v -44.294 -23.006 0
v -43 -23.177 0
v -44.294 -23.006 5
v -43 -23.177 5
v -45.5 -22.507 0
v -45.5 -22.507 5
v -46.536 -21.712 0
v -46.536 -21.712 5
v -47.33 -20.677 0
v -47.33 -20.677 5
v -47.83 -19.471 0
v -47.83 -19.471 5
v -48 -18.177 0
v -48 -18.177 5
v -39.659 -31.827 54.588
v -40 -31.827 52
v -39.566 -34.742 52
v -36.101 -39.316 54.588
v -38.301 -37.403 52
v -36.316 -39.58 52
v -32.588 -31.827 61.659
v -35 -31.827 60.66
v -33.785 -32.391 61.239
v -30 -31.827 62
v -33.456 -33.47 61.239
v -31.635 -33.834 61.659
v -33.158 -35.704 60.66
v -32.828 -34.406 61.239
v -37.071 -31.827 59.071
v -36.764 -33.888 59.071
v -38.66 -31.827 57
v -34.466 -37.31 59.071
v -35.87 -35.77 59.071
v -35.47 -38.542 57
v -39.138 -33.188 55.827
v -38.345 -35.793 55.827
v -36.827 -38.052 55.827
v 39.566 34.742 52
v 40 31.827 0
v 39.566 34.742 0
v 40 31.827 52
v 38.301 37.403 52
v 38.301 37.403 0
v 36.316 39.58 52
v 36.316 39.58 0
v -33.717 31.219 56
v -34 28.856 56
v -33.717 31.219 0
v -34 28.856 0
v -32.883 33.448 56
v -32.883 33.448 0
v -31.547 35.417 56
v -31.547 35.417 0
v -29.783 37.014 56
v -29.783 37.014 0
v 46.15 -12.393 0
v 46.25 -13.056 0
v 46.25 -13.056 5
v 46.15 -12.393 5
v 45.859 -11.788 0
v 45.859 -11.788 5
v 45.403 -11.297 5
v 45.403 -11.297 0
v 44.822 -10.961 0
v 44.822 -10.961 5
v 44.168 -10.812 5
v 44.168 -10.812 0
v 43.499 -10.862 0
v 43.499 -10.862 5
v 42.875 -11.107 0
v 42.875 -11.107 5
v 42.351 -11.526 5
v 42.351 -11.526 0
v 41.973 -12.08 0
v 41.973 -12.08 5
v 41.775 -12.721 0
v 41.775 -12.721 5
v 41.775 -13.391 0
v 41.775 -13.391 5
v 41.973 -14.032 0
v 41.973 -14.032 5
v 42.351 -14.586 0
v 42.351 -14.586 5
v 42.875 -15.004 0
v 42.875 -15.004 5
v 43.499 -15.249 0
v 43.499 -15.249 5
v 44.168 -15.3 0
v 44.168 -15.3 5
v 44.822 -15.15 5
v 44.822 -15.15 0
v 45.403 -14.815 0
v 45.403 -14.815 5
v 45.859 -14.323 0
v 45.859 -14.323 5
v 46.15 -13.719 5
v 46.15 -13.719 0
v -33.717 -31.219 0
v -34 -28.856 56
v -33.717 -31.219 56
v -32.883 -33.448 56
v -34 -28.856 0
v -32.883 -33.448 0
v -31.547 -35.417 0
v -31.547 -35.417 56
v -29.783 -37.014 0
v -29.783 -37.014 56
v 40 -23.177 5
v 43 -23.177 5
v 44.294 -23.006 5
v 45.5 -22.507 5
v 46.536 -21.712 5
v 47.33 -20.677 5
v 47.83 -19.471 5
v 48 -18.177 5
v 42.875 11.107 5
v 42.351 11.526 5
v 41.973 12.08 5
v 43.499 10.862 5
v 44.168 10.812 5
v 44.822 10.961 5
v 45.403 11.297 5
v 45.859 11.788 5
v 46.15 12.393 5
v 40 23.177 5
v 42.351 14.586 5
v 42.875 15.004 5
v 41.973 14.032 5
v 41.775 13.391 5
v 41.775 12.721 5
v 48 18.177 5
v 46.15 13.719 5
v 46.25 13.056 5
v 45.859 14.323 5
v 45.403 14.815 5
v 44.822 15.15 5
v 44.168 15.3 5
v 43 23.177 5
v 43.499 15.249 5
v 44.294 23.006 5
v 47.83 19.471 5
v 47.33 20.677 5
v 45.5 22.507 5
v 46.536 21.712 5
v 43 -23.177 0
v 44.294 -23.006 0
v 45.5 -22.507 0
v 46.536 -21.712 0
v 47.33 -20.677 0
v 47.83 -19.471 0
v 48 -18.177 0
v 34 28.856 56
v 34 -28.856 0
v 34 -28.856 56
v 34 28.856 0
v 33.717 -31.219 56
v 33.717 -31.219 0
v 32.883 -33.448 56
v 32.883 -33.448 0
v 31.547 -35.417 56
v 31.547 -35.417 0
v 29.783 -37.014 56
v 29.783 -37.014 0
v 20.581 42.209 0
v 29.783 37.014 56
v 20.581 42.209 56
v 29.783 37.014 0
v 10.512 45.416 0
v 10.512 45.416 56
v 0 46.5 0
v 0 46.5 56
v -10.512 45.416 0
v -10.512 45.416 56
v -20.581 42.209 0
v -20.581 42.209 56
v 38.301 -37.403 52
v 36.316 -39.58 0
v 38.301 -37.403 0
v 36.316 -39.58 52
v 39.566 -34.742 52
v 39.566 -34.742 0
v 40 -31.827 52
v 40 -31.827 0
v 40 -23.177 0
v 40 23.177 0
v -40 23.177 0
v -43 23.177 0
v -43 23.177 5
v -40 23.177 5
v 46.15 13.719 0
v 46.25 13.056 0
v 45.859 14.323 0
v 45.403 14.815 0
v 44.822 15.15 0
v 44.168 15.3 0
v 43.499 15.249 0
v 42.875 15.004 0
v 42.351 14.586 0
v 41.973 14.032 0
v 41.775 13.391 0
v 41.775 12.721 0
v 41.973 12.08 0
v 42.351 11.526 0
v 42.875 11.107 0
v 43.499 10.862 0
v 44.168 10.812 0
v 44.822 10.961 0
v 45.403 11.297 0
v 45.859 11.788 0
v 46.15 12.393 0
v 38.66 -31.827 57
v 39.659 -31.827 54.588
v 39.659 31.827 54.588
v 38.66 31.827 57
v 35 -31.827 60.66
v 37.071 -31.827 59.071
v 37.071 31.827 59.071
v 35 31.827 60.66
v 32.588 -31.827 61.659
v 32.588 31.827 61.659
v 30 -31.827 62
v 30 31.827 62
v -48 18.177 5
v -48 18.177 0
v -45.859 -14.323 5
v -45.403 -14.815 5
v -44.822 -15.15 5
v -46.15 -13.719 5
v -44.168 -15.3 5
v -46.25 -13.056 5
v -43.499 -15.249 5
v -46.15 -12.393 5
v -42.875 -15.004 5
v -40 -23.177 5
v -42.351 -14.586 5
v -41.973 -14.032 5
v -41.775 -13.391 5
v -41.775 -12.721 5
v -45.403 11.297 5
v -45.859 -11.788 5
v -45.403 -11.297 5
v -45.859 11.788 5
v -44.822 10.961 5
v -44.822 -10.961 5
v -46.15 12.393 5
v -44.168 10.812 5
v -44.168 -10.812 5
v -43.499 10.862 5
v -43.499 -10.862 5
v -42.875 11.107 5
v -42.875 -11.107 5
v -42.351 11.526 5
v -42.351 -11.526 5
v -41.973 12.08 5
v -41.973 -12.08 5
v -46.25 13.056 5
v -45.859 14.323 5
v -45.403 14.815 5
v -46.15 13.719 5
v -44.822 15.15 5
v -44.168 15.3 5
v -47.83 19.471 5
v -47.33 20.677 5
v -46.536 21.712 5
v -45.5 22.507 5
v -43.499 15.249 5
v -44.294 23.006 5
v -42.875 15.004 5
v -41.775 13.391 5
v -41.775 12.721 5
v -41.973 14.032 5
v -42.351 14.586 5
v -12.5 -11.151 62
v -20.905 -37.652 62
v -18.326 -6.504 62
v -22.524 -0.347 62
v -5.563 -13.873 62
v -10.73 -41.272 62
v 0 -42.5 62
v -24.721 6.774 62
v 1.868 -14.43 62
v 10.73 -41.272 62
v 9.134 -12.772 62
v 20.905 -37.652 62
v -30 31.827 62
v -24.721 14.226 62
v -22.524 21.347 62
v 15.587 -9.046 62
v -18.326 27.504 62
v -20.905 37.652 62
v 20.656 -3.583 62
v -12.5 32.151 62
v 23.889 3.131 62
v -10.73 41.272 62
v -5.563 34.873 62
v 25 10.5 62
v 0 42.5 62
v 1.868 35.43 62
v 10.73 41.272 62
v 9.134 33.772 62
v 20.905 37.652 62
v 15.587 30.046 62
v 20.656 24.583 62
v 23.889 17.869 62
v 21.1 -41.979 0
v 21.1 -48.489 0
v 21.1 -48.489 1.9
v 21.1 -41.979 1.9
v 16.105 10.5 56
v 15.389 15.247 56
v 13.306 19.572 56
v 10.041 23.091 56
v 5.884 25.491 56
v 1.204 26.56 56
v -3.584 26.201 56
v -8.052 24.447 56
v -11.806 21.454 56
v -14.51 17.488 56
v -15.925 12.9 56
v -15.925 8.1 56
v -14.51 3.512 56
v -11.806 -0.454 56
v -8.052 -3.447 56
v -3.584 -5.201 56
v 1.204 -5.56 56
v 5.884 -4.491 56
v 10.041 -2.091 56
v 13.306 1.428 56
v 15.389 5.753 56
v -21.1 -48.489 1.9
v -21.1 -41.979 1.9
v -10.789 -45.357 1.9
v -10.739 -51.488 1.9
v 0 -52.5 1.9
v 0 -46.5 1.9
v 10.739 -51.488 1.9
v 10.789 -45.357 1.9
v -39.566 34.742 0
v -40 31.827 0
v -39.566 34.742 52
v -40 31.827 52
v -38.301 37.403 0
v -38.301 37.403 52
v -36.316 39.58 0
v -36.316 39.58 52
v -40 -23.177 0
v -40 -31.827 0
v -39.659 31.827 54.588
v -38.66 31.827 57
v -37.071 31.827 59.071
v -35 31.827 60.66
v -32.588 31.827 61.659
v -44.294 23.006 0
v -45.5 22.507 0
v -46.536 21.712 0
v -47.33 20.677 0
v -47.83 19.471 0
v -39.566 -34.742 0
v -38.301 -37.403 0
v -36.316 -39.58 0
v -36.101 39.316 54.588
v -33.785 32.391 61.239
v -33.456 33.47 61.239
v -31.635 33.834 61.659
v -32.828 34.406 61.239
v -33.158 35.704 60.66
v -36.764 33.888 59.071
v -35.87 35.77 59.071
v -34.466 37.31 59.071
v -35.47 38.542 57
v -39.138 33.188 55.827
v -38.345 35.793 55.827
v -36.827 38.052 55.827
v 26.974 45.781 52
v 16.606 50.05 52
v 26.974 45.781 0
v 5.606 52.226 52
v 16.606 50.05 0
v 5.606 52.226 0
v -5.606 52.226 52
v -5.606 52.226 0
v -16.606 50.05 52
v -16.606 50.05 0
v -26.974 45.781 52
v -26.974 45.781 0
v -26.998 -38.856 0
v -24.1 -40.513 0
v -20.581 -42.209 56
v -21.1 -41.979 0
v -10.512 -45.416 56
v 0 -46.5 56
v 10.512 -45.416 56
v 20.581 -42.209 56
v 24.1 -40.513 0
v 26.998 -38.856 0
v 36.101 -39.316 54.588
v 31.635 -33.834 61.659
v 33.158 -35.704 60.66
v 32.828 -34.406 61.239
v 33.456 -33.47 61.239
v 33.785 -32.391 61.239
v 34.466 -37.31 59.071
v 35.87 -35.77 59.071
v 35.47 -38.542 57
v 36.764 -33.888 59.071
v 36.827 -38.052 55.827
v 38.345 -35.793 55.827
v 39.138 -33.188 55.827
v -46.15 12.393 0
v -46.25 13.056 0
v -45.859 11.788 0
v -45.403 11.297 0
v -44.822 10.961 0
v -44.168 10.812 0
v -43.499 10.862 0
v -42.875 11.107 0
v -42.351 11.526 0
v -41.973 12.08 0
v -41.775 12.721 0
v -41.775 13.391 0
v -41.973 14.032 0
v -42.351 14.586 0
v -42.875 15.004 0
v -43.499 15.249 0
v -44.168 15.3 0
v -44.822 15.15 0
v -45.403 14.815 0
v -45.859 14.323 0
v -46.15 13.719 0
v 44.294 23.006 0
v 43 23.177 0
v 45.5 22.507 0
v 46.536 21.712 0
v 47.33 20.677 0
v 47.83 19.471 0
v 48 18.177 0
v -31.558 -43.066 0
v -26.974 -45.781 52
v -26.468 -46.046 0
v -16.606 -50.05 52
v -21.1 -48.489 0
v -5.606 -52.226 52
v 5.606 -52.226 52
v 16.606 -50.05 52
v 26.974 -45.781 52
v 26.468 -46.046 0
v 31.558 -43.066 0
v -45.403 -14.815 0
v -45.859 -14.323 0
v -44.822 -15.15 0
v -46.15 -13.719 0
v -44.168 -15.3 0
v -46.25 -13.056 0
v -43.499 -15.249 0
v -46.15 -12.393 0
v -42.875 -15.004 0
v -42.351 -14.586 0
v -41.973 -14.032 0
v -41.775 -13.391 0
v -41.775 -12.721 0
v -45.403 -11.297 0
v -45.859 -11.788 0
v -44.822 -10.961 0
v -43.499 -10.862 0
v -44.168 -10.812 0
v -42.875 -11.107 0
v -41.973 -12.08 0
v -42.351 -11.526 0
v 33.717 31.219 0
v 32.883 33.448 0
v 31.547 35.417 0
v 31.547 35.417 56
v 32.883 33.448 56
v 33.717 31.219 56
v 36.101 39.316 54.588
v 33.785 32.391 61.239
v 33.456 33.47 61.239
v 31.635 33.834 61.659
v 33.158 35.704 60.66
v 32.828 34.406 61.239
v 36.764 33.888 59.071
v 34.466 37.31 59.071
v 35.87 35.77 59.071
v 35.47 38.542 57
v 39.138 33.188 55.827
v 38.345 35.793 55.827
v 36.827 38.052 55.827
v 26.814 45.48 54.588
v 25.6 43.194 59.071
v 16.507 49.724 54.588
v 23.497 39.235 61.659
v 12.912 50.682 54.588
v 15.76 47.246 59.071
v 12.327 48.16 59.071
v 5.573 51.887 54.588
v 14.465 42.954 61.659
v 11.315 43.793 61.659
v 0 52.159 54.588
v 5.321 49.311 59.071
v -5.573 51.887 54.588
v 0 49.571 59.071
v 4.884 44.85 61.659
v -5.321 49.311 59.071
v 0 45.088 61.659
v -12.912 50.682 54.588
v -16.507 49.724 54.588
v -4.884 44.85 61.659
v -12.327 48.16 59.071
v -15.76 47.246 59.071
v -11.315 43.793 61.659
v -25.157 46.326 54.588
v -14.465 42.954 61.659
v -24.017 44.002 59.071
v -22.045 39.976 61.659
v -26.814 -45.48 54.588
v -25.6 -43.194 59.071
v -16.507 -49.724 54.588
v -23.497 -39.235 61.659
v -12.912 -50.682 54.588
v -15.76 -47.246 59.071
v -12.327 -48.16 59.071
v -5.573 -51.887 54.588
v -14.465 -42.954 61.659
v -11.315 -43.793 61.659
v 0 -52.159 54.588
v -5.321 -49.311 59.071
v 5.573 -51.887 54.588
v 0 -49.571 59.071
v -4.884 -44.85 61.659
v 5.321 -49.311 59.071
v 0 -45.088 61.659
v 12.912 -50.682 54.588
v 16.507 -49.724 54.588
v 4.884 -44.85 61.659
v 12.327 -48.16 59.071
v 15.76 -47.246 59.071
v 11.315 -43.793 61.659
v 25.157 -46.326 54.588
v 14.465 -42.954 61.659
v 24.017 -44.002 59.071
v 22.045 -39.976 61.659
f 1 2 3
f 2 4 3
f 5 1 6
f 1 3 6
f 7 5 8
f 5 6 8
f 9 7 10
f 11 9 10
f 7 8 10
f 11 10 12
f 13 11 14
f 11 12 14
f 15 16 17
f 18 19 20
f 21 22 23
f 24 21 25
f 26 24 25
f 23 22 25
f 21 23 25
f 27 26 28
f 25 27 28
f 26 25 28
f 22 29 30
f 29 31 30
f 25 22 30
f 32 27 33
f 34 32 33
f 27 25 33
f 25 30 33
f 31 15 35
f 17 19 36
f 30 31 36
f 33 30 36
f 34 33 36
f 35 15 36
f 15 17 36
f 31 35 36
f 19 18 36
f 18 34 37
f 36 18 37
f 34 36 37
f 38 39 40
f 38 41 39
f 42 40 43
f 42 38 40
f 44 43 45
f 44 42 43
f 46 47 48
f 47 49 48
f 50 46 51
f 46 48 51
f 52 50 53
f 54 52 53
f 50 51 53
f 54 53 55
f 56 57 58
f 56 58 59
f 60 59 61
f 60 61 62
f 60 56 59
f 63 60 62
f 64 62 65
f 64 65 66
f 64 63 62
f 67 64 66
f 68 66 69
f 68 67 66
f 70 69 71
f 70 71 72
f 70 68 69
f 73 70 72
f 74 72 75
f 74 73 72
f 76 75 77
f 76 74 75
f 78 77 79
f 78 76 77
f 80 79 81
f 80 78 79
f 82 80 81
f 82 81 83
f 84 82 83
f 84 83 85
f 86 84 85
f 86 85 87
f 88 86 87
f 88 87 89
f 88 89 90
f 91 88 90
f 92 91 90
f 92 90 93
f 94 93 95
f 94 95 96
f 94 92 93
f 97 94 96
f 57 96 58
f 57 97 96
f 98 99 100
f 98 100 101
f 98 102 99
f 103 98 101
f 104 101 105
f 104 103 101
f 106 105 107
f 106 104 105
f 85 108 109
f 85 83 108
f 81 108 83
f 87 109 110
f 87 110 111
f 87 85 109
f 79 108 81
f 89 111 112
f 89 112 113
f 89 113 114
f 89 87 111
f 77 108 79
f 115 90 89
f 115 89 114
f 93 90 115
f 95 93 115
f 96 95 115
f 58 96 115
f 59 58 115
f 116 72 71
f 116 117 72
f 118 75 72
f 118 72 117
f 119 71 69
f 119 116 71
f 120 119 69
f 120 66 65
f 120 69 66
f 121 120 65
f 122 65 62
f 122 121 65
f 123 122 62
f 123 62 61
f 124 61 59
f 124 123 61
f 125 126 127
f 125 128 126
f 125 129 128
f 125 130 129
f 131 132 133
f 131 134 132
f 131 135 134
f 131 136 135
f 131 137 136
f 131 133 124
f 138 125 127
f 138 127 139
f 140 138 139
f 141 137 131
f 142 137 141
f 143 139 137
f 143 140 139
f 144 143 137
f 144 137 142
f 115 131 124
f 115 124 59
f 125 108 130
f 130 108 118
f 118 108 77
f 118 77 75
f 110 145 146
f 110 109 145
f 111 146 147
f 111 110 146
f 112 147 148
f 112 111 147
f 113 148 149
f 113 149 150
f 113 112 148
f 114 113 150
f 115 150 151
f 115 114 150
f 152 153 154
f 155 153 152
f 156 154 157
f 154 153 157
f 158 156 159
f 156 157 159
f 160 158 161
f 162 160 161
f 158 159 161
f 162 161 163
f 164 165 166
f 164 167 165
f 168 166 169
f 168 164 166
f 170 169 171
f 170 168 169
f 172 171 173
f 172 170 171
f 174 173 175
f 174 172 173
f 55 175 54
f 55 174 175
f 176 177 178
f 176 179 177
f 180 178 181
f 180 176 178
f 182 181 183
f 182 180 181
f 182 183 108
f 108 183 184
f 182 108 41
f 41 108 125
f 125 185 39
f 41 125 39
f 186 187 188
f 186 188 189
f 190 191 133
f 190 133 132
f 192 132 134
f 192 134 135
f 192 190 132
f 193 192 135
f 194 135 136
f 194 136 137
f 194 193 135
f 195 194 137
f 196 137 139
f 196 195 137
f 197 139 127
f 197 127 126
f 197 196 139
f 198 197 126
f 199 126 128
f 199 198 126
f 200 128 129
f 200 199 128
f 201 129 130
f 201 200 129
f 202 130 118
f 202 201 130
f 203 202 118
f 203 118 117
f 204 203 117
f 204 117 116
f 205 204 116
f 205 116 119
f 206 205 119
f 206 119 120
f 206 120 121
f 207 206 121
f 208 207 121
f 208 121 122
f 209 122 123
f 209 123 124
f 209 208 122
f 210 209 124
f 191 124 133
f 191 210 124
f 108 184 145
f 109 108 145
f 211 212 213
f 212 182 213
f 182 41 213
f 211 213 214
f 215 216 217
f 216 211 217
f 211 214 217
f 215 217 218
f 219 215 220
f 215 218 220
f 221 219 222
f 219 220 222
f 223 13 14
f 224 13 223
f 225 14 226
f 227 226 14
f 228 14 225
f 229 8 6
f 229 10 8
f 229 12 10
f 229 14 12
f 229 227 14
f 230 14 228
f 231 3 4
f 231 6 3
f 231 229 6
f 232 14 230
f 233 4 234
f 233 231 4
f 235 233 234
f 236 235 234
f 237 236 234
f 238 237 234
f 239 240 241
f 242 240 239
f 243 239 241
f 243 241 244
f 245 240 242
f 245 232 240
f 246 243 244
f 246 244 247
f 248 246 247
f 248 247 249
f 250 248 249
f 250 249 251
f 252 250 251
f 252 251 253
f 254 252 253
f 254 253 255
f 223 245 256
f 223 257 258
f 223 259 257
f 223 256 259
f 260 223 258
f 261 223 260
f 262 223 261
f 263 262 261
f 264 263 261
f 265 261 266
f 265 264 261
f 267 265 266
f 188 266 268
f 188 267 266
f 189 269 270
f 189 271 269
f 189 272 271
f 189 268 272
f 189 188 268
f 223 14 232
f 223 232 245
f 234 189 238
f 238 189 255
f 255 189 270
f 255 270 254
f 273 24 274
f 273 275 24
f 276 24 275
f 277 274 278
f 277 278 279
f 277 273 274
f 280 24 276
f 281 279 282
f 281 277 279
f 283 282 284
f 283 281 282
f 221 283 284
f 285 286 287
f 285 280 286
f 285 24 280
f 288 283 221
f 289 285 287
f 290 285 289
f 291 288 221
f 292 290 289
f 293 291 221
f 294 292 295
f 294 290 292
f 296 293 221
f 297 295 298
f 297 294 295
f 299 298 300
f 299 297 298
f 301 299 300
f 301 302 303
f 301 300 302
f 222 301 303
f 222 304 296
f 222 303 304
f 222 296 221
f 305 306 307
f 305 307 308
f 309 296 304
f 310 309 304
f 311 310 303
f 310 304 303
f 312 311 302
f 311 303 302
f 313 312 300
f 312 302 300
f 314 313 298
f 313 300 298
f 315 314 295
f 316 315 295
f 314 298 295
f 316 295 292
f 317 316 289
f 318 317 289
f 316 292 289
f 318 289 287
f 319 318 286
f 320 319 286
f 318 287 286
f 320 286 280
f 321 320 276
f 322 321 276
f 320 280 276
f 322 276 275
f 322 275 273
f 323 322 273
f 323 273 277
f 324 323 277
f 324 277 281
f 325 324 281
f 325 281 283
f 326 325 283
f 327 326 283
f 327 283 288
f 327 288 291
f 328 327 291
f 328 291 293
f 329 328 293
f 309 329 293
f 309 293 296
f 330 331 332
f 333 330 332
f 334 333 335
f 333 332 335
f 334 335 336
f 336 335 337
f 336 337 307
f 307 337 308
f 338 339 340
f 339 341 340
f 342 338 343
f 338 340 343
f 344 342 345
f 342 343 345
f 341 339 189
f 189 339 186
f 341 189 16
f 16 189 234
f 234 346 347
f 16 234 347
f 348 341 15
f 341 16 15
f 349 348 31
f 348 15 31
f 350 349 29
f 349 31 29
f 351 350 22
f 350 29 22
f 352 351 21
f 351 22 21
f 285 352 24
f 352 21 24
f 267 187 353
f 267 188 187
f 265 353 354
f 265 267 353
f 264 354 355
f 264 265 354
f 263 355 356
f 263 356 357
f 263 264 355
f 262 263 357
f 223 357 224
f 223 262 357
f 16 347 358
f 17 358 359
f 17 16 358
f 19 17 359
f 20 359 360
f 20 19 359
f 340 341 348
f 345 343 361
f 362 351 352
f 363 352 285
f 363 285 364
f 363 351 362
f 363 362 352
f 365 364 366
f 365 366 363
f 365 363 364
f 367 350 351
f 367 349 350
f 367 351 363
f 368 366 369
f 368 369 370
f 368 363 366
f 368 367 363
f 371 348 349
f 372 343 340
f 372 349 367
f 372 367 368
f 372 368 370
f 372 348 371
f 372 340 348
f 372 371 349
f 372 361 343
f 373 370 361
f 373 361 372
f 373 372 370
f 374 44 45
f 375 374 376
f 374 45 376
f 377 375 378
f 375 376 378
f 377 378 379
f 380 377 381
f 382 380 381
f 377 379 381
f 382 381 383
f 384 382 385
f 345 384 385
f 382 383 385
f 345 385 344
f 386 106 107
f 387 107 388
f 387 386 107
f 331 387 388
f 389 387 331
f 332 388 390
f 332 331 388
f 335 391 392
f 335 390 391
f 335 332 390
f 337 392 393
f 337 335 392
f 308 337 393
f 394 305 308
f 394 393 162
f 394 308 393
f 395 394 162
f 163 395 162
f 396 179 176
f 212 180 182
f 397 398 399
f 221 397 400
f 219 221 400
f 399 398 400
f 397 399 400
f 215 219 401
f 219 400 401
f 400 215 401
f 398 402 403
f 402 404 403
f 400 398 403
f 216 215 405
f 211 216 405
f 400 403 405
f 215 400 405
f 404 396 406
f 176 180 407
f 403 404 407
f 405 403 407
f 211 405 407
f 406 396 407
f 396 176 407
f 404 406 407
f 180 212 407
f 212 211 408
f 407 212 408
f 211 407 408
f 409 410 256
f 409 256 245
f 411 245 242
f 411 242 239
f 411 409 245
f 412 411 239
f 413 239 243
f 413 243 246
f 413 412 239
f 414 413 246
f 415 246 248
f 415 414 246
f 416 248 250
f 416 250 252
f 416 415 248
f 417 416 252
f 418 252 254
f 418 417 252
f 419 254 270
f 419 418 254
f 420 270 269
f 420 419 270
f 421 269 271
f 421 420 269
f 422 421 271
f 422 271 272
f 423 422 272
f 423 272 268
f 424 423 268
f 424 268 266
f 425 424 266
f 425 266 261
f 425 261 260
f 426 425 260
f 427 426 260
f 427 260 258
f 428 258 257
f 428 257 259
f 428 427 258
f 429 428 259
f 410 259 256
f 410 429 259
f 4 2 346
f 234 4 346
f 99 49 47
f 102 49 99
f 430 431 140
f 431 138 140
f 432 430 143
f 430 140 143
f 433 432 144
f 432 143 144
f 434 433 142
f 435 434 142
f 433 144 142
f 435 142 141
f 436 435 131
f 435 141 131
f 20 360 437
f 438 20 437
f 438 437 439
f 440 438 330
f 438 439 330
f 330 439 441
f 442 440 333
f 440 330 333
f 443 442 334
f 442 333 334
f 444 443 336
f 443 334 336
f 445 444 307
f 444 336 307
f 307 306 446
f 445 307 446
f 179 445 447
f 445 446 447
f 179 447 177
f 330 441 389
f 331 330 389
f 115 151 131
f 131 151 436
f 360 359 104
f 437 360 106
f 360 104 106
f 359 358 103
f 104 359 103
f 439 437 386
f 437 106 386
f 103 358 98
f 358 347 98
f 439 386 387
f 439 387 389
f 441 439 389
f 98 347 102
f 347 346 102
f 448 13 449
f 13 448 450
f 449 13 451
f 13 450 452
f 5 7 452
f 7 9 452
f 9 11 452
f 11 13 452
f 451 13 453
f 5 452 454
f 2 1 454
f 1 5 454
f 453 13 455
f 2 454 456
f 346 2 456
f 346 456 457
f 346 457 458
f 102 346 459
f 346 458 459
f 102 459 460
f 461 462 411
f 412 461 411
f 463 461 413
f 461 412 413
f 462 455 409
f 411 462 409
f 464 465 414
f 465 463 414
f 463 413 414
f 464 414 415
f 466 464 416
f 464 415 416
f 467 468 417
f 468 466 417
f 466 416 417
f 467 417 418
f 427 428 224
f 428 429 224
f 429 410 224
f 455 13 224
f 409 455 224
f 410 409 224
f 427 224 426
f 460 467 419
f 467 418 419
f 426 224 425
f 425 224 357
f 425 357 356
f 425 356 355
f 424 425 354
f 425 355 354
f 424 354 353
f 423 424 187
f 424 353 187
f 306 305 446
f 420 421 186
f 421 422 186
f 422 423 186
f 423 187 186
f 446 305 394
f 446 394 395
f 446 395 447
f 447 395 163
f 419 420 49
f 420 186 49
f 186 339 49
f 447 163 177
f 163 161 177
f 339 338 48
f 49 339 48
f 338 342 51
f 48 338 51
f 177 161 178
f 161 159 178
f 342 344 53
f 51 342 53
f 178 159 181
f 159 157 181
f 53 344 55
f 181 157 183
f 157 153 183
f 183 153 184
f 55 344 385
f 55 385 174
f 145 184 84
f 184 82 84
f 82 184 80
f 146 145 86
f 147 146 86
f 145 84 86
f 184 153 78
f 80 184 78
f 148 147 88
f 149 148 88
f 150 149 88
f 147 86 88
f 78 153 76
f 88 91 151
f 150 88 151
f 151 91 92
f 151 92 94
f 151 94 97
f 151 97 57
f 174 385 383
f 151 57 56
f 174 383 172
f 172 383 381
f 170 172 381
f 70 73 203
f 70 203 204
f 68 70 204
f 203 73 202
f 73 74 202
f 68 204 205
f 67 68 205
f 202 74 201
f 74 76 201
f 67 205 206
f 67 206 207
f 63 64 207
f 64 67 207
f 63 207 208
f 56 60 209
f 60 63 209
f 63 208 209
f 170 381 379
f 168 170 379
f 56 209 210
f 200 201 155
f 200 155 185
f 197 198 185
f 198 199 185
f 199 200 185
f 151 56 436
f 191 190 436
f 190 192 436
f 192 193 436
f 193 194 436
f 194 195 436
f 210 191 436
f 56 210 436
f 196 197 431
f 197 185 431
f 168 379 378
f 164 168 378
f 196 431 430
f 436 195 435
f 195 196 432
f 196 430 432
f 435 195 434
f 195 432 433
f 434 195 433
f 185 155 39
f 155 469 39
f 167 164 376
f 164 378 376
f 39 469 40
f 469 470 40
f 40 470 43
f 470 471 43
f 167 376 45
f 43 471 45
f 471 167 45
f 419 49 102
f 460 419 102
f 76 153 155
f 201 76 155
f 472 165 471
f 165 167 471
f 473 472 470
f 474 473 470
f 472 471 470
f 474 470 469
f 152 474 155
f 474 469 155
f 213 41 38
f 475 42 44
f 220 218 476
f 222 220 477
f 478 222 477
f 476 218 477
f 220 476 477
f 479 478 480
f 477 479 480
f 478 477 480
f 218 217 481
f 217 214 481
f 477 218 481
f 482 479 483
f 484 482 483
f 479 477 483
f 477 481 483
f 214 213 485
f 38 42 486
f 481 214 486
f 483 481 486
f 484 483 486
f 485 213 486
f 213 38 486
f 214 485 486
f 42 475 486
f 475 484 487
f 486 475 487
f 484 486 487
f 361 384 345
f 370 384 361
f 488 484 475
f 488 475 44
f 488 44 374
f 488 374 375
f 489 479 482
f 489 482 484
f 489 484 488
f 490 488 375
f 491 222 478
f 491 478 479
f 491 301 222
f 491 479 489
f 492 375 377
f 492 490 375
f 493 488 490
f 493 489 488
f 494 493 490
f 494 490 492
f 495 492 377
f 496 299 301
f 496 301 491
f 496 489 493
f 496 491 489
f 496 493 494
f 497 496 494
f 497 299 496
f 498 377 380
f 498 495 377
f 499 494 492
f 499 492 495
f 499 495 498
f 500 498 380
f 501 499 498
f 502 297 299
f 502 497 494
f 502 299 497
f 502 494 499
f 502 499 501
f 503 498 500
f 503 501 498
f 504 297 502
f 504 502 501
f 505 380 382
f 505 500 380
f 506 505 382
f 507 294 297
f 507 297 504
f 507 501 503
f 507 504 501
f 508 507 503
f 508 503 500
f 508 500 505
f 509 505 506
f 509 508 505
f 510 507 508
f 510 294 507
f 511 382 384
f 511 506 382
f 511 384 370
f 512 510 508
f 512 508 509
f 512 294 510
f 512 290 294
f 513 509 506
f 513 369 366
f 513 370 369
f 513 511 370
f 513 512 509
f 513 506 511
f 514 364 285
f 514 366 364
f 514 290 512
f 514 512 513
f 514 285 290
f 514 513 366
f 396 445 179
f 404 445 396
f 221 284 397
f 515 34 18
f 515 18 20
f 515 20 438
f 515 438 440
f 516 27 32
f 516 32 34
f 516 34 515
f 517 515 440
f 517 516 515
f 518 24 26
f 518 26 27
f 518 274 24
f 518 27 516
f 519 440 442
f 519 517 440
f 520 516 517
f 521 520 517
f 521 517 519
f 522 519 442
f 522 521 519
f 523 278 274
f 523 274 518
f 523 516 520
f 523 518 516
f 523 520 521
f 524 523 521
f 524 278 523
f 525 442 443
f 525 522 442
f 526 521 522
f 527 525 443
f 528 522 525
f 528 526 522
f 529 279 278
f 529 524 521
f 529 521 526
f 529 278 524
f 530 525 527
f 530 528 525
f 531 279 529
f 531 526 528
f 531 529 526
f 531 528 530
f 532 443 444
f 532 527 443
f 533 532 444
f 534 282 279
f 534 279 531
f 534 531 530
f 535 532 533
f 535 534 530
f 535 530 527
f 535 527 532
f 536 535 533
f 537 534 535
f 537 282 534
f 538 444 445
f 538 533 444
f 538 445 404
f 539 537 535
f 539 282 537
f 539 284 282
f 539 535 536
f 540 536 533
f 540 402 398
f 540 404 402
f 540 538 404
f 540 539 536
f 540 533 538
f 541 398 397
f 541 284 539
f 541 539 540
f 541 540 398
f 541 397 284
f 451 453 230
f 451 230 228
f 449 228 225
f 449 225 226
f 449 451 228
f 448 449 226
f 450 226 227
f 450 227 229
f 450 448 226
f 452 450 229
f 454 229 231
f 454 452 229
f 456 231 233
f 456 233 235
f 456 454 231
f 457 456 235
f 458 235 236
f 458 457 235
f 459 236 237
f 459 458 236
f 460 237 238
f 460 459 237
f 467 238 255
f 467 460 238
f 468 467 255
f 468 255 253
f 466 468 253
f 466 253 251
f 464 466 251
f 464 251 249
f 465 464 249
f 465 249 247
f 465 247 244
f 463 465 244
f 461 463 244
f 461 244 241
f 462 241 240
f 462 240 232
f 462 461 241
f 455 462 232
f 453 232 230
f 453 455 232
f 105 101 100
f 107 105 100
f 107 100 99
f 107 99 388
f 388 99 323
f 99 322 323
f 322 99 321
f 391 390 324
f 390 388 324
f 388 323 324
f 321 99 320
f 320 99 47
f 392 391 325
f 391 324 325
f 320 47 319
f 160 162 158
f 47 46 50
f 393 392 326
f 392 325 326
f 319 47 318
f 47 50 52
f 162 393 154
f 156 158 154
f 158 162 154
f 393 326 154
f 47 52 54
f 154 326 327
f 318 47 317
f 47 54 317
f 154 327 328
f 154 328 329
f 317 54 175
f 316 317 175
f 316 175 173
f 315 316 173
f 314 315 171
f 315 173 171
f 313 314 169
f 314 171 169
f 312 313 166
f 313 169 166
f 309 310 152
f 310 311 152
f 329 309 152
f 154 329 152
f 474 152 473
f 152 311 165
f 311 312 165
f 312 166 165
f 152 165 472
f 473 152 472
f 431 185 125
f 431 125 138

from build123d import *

# Parameters (mm, degrees)
BOSS_EXTRUDE1_DEPTH = 62
SHELL1_T            = -6
FILLET2_R           = 10
FILLET3_R           = 10
SKETCH4_W           = 42.2
SKETCH4_H           = 27.964545036
CUT_EXTRUDE1_DEPTH  = 1.9
SKETCH5_R           = 25
CUT_EXTRUDE2_DEPTH  = 91.55523235
DRAFT1_ANGLE        = 56
SKETCH6_W           = 8
SKETCH6_H           = 46.353363522
SKETCH6_R           = 2.25
BOSS_EXTRUDE2_DEPTH = 5
FILLET4_R           = 5


with BuildPart() as part:
    # Sketch2 → Boss-Extrude1 (new body)
    with BuildSketch(Plane.XY):
        with BuildLine():
            Line((-40, 36.306779105), (-40, -36.306779105))
            ThreePointArc((-40, -36.306779105), (0, -52.5), (40, -36.306779105))
            Line((40, -36.306779105), (40, 36.306779105))
            ThreePointArc((40, 36.306779105), (0, 52.5), (-40, 36.306779105))
        make_face()
    extrude(amount=BOSS_EXTRUDE1_DEPTH)

    # Shell1
    shell1_openings = [part.faces().sort_by_distance(p)[0] for p in [
        (0, 0, 0),
    ]]
    offset(amount=SHELL1_T, openings=shell1_openings, kind=Kind.INTERSECTION)

    # Fillet2
    fillet2_edges = [part.edges().sort_by_distance(p)[0] for p in [
        (0, -52.5, 62),
        (40, 0, 62),
        (0, 52.5, 62),
        (40, 36.306779105, 31),
        (40, -36.306779105, 31),
        (-40, -36.306779105, 31),
        (-40, 36.306779105, 31),
        (-40, 0, 62),
    ]]
    fillet(fillet2_edges, radius=FILLET2_R)

    # Fillet3
    fillet3_edges = [part.edges().sort_by_distance(p)[0] for p in [
        (34, 33.681390875, 28),
        (-34, 33.681390875, 28),
        (-34, -33.681390875, 28),
        (34, -33.681390875, 28),
    ]]
    fillet(fillet3_edges, radius=FILLET3_R)

    # Sketch4 → Cut-Extrude1 (cut)
    with BuildSketch(Plane.XY):
        with Locations((0, -42.064156307)):
            Rectangle(SKETCH4_W, SKETCH4_H)
    extrude(amount=CUT_EXTRUDE1_DEPTH, mode=Mode.SUBTRACT)

    # Sketch5 → Cut-Extrude2 (cut, through all)
    with BuildSketch(Plane.XY.offset(62)):
        with Locations((0, 10.5)):
            Circle(SKETCH5_R)
    extrude(amount=-CUT_EXTRUDE2_DEPTH, mode=Mode.SUBTRACT)

    # Draft1
    draft1_faces = [part.faces().sort_by_distance(p)[0] for p in [
        (-25, 10.5, 59),
    ]]
    draft(draft1_faces, Plane(origin=(0, -5, 62), x_dir=(1, 0, 0), z_dir=(0, 0, 1)), DRAFT1_ANGLE)

    # Sketch6 → Boss-Extrude2 (add)
    # profile 1 of 2: a face of its own
    with BuildSketch(Plane.XY):
        with Locations((44, 0)):
            Rectangle(SKETCH6_W, SKETCH6_H)
        with Locations((44, 13.05590564)):
            Circle(SKETCH6_R, mode=Mode.SUBTRACT)
        with Locations((44, -13.05590564)):
            Circle(SKETCH6_R, mode=Mode.SUBTRACT)
    # profile 2 of 2: a face of its own
    with BuildSketch(Plane.XY):
        with Locations((-44, 0)):
            Rectangle(SKETCH6_W, SKETCH6_H)
        with Locations(Location((-44, -13.05590564, 0), (0, 0, 180))):
            Circle(SKETCH6_R, mode=Mode.SUBTRACT)
        with Locations(Location((-44, 13.05590564, 0), (0, 0, 180))):
            Circle(SKETCH6_R, mode=Mode.SUBTRACT)
    extrude(amount=BOSS_EXTRUDE2_DEPTH)

    # Fillet4
    fillet4_edges = [part.edges().sort_by_distance(p)[0] for p in [
        (48, -23.176681761, 2.5),
        (48, 23.176681761, 2.5),
        (-48, 23.176681761, 2.5),
        (-48, -23.176681761, 2.5),
    ]]
    fillet(fillet4_edges, radius=FILLET4_R)


solid = part.part
